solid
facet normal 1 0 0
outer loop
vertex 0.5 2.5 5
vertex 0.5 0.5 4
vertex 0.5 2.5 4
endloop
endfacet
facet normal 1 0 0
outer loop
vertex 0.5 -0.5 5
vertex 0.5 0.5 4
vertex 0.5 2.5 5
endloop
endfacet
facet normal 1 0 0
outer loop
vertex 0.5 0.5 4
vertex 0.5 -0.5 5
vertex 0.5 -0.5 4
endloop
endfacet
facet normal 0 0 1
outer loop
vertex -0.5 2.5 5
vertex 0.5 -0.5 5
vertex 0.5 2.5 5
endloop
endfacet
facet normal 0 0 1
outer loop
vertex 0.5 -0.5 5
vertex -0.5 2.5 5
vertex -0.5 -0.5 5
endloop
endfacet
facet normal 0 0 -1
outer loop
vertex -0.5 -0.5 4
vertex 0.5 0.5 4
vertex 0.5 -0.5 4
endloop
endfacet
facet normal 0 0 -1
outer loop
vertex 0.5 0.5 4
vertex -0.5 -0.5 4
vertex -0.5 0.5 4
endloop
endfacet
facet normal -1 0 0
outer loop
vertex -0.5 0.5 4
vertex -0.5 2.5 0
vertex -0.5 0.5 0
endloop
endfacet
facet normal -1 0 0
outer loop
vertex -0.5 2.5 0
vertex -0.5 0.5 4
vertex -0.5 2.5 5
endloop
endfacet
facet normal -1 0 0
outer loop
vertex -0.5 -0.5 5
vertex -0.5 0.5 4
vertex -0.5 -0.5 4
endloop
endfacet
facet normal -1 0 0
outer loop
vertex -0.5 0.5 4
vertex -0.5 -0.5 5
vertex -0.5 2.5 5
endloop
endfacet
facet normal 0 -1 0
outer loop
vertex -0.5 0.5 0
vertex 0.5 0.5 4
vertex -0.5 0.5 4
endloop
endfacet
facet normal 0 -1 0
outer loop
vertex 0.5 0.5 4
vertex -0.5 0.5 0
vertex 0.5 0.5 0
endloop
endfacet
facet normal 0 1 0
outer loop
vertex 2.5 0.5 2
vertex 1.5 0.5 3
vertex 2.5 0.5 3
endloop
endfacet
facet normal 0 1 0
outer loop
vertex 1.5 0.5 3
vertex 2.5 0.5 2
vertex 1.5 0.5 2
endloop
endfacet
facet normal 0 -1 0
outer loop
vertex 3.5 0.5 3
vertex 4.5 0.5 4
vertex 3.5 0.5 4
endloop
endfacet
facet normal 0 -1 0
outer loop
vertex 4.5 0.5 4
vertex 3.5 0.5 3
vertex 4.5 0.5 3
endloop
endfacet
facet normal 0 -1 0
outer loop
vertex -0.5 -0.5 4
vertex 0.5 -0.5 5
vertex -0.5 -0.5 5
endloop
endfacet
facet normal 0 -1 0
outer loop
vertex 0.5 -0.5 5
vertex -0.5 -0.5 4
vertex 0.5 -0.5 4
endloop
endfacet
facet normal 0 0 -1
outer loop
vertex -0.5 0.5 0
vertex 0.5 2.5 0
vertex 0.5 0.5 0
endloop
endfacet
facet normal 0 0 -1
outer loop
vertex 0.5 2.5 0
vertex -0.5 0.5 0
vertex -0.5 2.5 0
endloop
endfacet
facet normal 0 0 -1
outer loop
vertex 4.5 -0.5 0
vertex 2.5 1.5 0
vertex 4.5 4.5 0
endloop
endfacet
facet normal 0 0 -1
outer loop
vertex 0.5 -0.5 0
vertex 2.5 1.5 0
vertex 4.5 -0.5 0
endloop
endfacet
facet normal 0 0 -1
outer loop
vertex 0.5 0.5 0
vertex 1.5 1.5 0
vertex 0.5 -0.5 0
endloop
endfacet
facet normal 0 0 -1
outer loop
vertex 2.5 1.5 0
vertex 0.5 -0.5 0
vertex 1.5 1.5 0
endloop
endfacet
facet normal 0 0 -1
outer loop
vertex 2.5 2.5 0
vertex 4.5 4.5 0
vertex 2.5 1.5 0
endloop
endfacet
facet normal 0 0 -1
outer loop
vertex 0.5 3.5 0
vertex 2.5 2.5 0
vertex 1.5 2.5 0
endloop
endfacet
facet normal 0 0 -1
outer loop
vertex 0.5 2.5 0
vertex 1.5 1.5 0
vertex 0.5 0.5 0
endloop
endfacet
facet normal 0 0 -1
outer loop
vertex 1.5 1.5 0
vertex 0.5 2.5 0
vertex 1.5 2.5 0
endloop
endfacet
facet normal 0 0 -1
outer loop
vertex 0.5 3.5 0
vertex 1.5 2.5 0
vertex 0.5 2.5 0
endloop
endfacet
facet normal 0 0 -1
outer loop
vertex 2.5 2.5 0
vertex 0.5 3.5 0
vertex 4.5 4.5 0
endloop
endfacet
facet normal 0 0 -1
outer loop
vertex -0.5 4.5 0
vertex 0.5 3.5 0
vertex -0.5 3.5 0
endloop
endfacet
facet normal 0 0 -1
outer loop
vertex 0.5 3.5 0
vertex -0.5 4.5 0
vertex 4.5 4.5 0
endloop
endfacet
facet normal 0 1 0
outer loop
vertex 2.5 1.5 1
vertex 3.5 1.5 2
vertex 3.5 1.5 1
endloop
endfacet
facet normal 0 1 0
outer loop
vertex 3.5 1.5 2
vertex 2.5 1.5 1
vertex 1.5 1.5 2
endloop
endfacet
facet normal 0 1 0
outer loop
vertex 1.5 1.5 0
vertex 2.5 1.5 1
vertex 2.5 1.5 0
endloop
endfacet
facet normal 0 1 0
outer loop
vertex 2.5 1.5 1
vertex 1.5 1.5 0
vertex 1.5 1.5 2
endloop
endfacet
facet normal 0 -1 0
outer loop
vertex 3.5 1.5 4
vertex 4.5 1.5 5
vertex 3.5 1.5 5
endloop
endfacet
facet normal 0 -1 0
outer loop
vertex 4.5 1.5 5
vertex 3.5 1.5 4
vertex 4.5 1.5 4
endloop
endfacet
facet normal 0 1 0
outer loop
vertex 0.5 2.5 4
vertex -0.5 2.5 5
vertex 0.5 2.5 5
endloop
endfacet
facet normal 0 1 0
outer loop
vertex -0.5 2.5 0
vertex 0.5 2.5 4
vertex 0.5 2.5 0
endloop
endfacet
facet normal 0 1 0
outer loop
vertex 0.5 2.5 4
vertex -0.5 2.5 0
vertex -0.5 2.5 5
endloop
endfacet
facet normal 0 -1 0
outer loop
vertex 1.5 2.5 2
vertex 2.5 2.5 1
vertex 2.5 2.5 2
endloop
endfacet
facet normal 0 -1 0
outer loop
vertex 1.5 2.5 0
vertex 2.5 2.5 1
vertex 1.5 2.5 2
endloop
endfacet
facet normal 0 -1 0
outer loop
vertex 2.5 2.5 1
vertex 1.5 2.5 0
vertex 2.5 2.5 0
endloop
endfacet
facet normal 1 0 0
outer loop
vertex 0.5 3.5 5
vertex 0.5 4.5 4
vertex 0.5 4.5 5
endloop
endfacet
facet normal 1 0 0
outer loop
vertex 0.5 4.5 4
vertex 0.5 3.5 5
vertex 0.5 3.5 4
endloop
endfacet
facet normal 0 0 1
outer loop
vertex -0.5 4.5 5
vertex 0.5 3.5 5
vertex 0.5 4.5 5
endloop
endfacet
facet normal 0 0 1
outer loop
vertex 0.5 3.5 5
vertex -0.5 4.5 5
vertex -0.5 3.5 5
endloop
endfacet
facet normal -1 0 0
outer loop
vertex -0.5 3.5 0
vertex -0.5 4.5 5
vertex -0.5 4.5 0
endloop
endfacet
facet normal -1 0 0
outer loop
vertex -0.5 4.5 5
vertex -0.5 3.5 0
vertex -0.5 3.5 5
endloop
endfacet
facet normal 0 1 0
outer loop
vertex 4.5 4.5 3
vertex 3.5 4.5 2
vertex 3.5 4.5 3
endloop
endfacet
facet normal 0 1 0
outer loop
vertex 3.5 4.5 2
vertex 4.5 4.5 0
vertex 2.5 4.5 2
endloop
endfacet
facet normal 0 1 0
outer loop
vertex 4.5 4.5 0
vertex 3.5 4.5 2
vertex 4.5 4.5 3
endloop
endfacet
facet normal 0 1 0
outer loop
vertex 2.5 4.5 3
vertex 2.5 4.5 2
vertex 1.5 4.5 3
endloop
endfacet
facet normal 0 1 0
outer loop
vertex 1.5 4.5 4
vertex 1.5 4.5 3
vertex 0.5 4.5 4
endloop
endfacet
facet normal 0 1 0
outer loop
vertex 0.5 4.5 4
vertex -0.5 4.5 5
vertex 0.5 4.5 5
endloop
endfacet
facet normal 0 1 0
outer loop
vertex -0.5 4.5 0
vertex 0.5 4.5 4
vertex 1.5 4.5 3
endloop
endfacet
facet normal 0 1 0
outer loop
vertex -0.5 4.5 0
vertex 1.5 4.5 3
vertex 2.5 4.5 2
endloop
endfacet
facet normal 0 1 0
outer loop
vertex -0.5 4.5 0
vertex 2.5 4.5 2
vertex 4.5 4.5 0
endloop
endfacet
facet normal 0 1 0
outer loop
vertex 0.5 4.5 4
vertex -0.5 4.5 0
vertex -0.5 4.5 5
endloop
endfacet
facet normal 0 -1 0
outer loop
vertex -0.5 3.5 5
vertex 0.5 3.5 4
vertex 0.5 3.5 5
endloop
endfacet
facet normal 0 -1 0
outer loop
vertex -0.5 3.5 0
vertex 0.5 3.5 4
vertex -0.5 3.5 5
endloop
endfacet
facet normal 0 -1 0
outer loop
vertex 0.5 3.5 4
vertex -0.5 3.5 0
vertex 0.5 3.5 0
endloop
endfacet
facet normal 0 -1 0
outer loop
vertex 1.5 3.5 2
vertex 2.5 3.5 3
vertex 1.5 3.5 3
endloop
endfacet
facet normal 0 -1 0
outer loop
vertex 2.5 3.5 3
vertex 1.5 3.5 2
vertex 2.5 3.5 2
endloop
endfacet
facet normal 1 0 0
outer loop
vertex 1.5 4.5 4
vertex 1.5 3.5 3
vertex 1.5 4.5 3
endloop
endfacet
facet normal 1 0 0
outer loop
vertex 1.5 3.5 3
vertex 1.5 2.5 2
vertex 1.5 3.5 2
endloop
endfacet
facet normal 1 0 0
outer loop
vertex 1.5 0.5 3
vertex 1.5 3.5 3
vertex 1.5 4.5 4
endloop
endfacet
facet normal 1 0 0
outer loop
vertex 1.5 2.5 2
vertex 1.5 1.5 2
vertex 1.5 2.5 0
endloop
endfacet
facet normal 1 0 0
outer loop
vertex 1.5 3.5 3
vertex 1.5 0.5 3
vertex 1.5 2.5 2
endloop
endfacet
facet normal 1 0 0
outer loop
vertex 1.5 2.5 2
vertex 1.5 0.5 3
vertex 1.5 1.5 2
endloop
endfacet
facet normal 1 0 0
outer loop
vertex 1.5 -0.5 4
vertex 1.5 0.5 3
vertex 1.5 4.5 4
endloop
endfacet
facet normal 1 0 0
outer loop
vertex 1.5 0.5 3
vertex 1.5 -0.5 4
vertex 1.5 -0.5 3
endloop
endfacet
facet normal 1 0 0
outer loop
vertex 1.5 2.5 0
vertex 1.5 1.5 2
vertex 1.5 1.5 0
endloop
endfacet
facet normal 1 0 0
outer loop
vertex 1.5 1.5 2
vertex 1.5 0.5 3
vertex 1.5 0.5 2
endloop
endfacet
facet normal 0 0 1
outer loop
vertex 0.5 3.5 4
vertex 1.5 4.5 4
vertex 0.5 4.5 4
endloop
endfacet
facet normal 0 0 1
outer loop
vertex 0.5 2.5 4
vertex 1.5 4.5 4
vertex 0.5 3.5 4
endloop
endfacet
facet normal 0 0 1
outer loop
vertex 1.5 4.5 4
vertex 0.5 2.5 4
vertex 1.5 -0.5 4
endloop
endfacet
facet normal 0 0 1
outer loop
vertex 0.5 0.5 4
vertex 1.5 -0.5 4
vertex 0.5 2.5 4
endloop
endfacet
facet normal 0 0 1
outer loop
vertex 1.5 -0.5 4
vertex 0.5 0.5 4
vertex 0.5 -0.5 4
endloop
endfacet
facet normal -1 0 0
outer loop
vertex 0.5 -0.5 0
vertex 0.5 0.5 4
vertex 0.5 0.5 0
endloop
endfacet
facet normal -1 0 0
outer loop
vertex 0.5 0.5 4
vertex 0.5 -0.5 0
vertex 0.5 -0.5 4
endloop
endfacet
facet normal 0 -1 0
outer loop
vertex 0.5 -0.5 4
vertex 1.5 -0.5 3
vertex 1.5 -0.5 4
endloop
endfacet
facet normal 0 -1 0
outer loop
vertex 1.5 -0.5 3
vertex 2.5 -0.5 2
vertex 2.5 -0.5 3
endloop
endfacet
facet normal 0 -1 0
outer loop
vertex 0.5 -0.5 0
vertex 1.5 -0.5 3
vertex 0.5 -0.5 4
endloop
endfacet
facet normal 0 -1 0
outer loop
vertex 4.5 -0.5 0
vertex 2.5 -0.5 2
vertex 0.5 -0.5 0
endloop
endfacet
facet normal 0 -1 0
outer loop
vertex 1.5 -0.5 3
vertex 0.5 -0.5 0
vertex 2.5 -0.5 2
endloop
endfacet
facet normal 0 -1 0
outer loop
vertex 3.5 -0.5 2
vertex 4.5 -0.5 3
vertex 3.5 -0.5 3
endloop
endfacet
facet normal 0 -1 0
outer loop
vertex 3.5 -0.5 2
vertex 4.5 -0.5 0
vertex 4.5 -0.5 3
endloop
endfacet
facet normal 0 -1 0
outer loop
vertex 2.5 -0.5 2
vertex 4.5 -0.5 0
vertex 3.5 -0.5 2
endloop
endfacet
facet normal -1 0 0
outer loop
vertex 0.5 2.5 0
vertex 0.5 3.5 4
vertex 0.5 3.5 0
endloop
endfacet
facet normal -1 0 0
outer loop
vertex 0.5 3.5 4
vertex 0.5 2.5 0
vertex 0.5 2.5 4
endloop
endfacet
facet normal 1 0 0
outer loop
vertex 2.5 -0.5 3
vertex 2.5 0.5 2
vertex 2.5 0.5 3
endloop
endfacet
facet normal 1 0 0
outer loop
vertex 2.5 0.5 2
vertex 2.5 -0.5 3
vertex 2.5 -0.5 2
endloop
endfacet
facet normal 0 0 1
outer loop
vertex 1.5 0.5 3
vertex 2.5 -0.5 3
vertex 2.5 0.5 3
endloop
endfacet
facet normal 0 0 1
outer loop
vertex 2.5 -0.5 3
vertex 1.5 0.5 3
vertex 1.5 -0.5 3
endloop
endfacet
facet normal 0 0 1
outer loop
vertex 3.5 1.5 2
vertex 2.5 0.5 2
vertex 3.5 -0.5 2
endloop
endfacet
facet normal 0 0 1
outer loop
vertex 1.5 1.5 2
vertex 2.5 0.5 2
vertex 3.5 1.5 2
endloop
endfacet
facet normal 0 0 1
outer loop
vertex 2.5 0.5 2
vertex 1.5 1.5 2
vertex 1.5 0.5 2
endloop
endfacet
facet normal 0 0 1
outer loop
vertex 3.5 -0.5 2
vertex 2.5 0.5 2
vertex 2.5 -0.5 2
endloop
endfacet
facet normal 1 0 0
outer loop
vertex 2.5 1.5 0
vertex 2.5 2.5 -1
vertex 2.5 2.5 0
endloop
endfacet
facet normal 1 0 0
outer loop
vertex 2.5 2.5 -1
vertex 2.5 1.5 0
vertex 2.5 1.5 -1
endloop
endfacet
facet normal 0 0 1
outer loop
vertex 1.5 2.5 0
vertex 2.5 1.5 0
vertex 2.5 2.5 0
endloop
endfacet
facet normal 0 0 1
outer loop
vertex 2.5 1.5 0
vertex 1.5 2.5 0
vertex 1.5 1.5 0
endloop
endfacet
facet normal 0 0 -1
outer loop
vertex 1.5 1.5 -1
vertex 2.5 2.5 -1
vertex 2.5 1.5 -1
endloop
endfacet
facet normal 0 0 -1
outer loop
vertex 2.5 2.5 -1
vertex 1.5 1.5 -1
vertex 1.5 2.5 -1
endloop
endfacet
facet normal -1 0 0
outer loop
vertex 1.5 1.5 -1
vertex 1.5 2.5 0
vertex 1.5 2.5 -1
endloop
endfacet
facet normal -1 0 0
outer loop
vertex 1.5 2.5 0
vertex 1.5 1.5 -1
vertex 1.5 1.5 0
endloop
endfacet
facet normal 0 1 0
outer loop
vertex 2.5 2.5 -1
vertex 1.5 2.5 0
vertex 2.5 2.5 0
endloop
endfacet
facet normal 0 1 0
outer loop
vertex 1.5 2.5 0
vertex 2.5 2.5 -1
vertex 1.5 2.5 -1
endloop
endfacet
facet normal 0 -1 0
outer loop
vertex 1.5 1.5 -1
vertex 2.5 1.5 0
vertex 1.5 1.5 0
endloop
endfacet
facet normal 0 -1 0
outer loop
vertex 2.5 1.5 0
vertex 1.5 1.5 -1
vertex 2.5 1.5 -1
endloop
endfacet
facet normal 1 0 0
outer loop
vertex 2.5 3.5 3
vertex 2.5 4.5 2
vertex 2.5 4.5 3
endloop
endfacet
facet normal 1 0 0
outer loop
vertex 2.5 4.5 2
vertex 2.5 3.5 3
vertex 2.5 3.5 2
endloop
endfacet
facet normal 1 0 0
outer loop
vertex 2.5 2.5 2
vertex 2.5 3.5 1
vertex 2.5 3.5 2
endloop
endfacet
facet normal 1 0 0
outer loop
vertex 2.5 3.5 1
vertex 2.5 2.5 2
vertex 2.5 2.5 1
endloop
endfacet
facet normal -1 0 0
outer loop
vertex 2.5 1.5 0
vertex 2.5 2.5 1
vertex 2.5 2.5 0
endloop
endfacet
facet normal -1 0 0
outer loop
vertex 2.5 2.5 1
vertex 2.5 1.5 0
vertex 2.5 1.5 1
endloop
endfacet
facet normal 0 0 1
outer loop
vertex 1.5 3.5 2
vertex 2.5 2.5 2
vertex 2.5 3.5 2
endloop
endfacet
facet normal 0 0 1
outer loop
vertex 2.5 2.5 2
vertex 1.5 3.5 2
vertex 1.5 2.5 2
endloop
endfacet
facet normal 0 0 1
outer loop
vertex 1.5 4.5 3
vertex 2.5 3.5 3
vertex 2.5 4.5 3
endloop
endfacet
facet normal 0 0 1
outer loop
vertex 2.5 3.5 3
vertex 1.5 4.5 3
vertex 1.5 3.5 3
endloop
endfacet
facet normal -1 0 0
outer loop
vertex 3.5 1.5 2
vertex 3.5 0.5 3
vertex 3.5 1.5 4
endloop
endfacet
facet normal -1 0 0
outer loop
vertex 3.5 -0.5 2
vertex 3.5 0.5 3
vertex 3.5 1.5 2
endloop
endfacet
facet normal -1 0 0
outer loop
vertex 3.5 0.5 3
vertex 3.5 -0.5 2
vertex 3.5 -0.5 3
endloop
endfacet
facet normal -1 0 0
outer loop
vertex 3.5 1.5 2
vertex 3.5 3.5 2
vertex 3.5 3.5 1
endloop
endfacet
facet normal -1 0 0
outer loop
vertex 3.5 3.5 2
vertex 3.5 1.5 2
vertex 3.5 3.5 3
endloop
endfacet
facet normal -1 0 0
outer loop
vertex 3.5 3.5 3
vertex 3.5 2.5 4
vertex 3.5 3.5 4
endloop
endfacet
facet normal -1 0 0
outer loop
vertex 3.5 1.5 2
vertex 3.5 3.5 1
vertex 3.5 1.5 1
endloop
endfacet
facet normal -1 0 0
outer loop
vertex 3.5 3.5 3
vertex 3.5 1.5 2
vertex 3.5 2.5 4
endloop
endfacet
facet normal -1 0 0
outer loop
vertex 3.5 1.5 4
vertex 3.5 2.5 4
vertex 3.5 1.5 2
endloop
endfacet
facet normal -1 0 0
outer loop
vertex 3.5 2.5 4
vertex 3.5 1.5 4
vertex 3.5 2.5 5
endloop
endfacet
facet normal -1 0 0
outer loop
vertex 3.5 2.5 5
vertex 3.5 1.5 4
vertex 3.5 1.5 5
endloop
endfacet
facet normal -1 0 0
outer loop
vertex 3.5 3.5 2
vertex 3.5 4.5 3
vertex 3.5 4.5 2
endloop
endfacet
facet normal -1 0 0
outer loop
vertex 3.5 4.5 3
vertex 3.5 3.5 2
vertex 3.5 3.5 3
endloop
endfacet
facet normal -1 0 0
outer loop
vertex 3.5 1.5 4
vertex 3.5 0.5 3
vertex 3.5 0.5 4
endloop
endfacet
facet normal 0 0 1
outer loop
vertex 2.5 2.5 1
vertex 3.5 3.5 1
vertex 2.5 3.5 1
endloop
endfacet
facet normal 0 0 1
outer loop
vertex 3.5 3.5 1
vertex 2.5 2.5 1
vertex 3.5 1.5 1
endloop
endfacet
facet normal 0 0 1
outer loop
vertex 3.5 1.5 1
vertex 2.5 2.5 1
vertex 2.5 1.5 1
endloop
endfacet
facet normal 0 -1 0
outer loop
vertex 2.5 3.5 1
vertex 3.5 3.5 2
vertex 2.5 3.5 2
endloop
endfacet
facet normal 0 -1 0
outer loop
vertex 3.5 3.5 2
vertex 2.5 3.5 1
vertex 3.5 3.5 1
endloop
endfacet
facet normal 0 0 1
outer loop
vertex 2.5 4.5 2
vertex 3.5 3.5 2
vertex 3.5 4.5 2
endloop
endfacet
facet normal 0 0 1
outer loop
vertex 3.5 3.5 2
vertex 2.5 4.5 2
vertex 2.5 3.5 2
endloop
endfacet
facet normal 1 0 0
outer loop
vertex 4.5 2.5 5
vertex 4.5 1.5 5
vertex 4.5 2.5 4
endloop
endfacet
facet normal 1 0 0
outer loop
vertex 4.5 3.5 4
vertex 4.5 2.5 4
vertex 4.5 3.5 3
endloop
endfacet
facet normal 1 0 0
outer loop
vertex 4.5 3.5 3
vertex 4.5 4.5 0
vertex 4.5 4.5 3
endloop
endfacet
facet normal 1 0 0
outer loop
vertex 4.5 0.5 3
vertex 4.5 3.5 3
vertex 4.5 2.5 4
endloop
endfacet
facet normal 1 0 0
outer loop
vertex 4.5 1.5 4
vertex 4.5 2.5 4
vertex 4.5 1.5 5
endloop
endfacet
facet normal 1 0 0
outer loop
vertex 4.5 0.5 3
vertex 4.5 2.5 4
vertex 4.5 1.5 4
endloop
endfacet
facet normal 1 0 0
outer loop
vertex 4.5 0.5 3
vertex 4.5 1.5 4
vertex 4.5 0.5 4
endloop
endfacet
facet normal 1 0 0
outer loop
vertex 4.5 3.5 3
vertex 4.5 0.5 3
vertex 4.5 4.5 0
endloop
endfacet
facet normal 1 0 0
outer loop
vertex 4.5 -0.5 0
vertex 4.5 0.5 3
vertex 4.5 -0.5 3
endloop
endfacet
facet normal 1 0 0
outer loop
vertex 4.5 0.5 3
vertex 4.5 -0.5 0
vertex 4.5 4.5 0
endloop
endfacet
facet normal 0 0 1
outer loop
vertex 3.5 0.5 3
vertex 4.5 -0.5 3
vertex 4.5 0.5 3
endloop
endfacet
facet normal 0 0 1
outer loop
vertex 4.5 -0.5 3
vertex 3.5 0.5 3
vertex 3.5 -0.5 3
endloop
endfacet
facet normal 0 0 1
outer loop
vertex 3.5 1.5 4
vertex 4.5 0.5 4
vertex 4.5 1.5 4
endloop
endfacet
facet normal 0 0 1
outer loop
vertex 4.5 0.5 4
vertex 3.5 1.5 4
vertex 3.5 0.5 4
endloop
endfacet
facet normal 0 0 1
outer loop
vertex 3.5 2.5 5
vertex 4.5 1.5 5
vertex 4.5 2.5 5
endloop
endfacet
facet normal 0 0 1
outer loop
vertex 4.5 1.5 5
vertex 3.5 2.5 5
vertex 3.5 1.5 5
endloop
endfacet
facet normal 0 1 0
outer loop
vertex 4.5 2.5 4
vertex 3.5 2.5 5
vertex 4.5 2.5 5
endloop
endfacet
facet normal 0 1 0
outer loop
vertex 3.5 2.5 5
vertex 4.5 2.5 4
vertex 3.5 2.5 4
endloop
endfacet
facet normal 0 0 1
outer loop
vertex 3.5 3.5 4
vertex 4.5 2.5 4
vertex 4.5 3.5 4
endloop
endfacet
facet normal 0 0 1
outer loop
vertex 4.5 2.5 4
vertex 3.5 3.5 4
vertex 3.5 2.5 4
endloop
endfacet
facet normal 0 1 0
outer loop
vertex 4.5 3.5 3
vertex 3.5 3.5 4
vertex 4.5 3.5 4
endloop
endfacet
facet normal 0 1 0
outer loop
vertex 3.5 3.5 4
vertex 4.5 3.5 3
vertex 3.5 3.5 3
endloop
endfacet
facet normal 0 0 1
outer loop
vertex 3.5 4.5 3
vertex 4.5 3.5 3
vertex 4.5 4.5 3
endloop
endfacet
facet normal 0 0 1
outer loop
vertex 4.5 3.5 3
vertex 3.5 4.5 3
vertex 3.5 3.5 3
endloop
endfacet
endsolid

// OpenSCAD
union() {
    translate([0, 0, 4.5]) color([1, 0, 0]) cube([1, 1, 1], center=true);
    translate([0, 1, 2.5]) cube([1, 1, 5], center=true);
    translate([0, 2, 2.5]) cube([1, 1, 5], center=true);
    translate([0, 4, 2.5]) cube([1, 1, 5], center=true);
    translate([1, 0, 2.0]) cube([1, 1, 4], center=true);
    translate([1, 1, 2.0]) cube([1, 1, 4], center=true);
    translate([1, 2, 2.0]) cube([1, 1, 4], center=true);
    translate([1, 3, 2.0]) cube([1, 1, 4], center=true);
    translate([1, 4, 2.0]) cube([1, 1, 4], center=true);
    translate([2, 0, 1.5]) cube([1, 1, 3], center=true);
    translate([2, 1, 1.0]) cube([1, 1, 2], center=true);
    translate([2, 2, -0.5]) color([0, 0, 1]) cube([1, 1, 1], center=true);
    translate([2, 3, 1.0]) cube([1, 1, 2], center=true);
    translate([2, 4, 1.5]) cube([1, 1, 3], center=true);
    translate([3, 0, 1.0]) cube([1, 1, 2], center=true);
    translate([3, 1, 1.0]) cube([1, 1, 2], center=true);
    translate([3, 2, 0.5]) cube([1, 1, 1], center=true);
    translate([3, 3, 0.5]) cube([1, 1, 1], center=true);
    translate([3, 4, 1.0]) cube([1, 1, 2], center=true);
    translate([4, 0, 1.5]) cube([1, 1, 3], center=true);
    translate([4, 1, 2.0]) cube([1, 1, 4], center=true);
    translate([4, 2, 2.5]) cube([1, 1, 5], center=true);
    translate([4, 3, 2.0]) cube([1, 1, 4], center=true);
    translate([4, 4, 1.5]) cube([1, 1, 3], center=true);
}
